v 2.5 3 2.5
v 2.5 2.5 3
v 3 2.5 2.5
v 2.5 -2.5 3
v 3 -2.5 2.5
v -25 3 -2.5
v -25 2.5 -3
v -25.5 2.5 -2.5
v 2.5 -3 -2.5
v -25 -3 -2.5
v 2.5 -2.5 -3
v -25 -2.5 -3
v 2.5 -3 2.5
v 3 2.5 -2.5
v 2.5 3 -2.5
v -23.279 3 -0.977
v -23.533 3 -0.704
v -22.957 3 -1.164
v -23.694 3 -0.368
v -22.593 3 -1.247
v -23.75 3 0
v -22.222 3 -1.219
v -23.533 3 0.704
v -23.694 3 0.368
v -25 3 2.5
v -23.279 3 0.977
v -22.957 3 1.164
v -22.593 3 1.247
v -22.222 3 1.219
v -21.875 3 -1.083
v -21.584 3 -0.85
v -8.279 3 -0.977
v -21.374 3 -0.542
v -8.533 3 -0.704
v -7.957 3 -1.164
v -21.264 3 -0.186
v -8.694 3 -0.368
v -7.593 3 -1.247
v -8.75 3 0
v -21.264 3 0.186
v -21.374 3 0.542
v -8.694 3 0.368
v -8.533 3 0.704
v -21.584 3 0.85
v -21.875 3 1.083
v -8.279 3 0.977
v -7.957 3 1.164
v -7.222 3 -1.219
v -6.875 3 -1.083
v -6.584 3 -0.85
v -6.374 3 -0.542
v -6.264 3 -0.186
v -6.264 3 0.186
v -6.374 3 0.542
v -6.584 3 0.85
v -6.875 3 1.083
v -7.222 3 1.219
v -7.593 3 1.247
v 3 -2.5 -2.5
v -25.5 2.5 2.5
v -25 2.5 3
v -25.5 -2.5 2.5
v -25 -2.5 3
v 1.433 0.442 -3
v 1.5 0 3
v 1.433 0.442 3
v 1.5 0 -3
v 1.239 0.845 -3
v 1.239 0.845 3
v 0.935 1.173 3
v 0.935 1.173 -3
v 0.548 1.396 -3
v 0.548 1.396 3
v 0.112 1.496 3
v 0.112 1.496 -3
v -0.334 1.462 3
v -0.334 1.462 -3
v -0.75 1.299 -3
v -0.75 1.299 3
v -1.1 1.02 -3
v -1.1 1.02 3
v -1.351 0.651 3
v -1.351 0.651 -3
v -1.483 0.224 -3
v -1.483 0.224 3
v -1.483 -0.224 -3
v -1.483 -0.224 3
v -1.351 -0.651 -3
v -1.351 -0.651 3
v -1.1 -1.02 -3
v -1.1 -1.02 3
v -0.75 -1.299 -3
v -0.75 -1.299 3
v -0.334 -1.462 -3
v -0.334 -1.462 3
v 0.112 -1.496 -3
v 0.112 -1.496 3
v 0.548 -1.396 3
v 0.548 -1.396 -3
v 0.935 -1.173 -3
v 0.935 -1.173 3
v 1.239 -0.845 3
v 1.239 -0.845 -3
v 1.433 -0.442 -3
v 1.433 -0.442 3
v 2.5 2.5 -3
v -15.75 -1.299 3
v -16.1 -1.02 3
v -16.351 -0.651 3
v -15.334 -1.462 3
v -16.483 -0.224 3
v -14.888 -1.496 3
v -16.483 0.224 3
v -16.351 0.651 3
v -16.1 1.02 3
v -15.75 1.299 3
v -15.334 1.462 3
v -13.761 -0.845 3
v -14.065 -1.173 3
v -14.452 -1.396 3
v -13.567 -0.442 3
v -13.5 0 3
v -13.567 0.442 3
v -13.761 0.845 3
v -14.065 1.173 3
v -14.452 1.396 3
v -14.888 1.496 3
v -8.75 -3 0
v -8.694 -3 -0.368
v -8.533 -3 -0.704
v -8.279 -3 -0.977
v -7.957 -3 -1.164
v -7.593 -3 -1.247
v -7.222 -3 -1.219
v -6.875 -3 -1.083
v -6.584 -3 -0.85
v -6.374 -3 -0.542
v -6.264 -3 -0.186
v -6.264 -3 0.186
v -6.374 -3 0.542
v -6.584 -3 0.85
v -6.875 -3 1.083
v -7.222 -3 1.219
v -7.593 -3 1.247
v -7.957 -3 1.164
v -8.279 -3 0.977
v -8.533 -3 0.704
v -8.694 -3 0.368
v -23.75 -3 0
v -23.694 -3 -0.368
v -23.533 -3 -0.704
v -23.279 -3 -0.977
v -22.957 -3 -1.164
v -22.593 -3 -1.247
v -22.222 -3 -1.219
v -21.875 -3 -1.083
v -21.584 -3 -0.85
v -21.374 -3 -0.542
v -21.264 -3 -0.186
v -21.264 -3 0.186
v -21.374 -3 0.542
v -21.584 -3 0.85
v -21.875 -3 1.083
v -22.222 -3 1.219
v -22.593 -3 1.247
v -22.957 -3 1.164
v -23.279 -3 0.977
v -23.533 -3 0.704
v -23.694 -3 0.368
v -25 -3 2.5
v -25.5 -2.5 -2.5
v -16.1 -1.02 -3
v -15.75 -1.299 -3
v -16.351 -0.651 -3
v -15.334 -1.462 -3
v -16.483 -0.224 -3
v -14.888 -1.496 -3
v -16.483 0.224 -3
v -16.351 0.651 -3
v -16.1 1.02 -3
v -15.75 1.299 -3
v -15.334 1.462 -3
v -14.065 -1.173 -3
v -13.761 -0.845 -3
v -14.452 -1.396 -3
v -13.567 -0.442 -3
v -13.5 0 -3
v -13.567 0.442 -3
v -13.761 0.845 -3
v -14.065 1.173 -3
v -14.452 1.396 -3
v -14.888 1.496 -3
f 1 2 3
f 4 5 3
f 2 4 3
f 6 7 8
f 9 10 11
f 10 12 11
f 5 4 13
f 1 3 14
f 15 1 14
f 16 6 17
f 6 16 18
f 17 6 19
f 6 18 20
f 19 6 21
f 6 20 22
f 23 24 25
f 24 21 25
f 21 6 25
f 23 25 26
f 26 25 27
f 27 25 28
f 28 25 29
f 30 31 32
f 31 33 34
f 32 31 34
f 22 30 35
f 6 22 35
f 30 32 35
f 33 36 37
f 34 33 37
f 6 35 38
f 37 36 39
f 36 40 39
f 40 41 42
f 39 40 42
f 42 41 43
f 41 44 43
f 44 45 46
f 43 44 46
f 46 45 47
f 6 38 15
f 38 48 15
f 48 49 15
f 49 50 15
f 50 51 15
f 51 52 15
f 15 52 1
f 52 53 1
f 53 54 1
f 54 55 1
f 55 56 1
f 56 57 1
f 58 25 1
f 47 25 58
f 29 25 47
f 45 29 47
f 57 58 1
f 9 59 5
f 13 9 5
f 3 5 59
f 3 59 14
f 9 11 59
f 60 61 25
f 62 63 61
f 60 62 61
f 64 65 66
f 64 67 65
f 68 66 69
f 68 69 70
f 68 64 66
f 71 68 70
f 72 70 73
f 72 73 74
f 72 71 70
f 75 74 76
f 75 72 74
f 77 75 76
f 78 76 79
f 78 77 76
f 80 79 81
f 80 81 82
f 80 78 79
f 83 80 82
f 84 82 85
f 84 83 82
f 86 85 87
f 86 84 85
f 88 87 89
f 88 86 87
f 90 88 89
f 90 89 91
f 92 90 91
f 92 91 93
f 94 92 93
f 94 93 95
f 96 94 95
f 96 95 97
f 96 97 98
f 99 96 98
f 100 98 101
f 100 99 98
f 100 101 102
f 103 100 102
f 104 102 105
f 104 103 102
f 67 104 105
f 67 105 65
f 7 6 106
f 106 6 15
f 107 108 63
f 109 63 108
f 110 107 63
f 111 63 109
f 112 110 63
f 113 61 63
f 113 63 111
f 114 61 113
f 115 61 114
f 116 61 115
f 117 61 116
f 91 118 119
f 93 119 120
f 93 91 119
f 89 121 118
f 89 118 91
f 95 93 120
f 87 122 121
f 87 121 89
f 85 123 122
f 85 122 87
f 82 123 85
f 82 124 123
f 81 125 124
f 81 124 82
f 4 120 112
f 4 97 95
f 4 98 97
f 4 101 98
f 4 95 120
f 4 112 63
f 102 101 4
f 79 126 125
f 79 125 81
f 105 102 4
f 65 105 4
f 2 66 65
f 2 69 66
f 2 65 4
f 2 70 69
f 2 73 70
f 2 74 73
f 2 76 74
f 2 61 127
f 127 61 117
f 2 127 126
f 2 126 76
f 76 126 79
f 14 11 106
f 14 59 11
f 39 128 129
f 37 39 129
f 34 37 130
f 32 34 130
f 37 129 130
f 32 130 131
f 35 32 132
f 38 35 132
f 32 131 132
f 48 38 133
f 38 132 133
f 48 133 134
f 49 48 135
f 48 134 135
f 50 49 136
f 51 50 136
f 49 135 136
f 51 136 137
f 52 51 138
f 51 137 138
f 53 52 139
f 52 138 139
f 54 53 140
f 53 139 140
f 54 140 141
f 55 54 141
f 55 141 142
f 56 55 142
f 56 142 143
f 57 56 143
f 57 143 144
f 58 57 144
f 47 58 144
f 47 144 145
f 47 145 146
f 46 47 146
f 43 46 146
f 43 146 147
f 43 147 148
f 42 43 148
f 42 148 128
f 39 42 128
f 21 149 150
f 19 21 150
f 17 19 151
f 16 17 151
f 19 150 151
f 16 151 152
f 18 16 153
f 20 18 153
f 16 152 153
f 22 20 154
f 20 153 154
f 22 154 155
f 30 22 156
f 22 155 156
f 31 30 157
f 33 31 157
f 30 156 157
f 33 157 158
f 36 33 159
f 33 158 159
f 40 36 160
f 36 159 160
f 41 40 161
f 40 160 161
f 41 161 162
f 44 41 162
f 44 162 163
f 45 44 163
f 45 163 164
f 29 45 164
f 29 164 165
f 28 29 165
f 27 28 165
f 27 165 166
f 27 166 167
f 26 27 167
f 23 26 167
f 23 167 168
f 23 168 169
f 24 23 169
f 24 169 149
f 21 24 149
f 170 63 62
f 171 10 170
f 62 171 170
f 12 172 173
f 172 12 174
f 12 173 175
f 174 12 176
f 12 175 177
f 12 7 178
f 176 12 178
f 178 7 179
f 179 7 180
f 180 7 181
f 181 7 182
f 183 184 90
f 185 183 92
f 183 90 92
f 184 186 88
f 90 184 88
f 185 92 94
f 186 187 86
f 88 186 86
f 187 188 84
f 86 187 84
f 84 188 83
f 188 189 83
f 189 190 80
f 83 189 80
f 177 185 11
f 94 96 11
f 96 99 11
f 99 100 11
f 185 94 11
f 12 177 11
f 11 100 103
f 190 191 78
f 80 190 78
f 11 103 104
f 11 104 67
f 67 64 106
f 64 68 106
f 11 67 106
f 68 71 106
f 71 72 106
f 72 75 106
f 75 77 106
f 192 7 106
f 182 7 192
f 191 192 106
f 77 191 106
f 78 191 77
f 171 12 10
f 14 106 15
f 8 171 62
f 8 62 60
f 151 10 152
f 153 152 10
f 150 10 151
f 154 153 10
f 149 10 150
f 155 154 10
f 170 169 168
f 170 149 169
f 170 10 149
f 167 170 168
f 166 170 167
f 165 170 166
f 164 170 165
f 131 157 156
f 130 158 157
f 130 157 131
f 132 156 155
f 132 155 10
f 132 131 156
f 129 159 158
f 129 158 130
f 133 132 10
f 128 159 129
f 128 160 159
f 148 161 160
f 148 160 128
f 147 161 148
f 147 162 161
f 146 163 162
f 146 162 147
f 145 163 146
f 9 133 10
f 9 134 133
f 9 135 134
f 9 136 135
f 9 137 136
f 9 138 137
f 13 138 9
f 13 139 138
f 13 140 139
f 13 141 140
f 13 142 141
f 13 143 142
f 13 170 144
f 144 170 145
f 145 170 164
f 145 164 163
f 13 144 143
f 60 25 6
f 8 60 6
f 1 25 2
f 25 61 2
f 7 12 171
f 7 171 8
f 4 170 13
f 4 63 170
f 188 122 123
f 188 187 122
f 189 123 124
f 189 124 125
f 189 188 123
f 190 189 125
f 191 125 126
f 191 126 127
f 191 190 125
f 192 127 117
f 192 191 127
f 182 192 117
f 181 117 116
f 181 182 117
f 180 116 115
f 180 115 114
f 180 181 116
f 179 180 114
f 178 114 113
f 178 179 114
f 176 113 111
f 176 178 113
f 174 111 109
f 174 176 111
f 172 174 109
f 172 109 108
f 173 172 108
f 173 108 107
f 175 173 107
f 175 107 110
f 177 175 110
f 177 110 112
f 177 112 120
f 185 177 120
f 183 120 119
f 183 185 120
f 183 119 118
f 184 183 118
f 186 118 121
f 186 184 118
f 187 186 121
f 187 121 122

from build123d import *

# Parameters (mm, degrees)
SKETCH_2_W         = 28.5
SKETCH_2_H         = 6
SKETCH_2_R         = 1.5
EXTRUDE_1_DEPTH    = 3
HOLE_WIZARD_M3_2_D = 2.5
CHAMFER_1_SIZE     = 0.5


with BuildPart() as part:
    # 草图2 → 凸台-拉伸1 (new body, symmetric)
    with BuildSketch(Plane.XY):
        with Locations((-11.25, 0)):
            Rectangle(SKETCH_2_W, SKETCH_2_H)
        with Locations((-15, 0)):
            Circle(SKETCH_2_R, mode=Mode.SUBTRACT)
        Circle(SKETCH_2_R, mode=Mode.SUBTRACT)
    extrude(amount=EXTRUDE_1_DEPTH, both=True)

    # M3 螺纹孔2 (through all)
    with Locations(Plane(origin=(0, 3, 0), x_dir=(1, 0, 0), z_dir=(0, 1, 0))):
        with Locations((-7.5, 0), (-22.5, 0)):
            Hole(HOLE_WIZARD_M3_2_D / 2)

    # 倒角1
    chamfer_1_edges = [part.edges().sort_by_distance(p)[0] for p in [
        (-11.25, -3, 3),
        (3, 0, 3),
        (-11.25, 3, 3),
        (3, 0, -3),
        (-11.25, -3, -3),
        (-25.5, 0, -3),
        (-11.25, 3, -3),
        (-25.5, 0, 3),
        (3, 3, 0),
        (3, -3, 0),
        (-25.5, -3, 0),
        (-25.5, 3, 0),
    ]]
    chamfer(chamfer_1_edges, length=CHAMFER_1_SIZE)


solid = part.part
